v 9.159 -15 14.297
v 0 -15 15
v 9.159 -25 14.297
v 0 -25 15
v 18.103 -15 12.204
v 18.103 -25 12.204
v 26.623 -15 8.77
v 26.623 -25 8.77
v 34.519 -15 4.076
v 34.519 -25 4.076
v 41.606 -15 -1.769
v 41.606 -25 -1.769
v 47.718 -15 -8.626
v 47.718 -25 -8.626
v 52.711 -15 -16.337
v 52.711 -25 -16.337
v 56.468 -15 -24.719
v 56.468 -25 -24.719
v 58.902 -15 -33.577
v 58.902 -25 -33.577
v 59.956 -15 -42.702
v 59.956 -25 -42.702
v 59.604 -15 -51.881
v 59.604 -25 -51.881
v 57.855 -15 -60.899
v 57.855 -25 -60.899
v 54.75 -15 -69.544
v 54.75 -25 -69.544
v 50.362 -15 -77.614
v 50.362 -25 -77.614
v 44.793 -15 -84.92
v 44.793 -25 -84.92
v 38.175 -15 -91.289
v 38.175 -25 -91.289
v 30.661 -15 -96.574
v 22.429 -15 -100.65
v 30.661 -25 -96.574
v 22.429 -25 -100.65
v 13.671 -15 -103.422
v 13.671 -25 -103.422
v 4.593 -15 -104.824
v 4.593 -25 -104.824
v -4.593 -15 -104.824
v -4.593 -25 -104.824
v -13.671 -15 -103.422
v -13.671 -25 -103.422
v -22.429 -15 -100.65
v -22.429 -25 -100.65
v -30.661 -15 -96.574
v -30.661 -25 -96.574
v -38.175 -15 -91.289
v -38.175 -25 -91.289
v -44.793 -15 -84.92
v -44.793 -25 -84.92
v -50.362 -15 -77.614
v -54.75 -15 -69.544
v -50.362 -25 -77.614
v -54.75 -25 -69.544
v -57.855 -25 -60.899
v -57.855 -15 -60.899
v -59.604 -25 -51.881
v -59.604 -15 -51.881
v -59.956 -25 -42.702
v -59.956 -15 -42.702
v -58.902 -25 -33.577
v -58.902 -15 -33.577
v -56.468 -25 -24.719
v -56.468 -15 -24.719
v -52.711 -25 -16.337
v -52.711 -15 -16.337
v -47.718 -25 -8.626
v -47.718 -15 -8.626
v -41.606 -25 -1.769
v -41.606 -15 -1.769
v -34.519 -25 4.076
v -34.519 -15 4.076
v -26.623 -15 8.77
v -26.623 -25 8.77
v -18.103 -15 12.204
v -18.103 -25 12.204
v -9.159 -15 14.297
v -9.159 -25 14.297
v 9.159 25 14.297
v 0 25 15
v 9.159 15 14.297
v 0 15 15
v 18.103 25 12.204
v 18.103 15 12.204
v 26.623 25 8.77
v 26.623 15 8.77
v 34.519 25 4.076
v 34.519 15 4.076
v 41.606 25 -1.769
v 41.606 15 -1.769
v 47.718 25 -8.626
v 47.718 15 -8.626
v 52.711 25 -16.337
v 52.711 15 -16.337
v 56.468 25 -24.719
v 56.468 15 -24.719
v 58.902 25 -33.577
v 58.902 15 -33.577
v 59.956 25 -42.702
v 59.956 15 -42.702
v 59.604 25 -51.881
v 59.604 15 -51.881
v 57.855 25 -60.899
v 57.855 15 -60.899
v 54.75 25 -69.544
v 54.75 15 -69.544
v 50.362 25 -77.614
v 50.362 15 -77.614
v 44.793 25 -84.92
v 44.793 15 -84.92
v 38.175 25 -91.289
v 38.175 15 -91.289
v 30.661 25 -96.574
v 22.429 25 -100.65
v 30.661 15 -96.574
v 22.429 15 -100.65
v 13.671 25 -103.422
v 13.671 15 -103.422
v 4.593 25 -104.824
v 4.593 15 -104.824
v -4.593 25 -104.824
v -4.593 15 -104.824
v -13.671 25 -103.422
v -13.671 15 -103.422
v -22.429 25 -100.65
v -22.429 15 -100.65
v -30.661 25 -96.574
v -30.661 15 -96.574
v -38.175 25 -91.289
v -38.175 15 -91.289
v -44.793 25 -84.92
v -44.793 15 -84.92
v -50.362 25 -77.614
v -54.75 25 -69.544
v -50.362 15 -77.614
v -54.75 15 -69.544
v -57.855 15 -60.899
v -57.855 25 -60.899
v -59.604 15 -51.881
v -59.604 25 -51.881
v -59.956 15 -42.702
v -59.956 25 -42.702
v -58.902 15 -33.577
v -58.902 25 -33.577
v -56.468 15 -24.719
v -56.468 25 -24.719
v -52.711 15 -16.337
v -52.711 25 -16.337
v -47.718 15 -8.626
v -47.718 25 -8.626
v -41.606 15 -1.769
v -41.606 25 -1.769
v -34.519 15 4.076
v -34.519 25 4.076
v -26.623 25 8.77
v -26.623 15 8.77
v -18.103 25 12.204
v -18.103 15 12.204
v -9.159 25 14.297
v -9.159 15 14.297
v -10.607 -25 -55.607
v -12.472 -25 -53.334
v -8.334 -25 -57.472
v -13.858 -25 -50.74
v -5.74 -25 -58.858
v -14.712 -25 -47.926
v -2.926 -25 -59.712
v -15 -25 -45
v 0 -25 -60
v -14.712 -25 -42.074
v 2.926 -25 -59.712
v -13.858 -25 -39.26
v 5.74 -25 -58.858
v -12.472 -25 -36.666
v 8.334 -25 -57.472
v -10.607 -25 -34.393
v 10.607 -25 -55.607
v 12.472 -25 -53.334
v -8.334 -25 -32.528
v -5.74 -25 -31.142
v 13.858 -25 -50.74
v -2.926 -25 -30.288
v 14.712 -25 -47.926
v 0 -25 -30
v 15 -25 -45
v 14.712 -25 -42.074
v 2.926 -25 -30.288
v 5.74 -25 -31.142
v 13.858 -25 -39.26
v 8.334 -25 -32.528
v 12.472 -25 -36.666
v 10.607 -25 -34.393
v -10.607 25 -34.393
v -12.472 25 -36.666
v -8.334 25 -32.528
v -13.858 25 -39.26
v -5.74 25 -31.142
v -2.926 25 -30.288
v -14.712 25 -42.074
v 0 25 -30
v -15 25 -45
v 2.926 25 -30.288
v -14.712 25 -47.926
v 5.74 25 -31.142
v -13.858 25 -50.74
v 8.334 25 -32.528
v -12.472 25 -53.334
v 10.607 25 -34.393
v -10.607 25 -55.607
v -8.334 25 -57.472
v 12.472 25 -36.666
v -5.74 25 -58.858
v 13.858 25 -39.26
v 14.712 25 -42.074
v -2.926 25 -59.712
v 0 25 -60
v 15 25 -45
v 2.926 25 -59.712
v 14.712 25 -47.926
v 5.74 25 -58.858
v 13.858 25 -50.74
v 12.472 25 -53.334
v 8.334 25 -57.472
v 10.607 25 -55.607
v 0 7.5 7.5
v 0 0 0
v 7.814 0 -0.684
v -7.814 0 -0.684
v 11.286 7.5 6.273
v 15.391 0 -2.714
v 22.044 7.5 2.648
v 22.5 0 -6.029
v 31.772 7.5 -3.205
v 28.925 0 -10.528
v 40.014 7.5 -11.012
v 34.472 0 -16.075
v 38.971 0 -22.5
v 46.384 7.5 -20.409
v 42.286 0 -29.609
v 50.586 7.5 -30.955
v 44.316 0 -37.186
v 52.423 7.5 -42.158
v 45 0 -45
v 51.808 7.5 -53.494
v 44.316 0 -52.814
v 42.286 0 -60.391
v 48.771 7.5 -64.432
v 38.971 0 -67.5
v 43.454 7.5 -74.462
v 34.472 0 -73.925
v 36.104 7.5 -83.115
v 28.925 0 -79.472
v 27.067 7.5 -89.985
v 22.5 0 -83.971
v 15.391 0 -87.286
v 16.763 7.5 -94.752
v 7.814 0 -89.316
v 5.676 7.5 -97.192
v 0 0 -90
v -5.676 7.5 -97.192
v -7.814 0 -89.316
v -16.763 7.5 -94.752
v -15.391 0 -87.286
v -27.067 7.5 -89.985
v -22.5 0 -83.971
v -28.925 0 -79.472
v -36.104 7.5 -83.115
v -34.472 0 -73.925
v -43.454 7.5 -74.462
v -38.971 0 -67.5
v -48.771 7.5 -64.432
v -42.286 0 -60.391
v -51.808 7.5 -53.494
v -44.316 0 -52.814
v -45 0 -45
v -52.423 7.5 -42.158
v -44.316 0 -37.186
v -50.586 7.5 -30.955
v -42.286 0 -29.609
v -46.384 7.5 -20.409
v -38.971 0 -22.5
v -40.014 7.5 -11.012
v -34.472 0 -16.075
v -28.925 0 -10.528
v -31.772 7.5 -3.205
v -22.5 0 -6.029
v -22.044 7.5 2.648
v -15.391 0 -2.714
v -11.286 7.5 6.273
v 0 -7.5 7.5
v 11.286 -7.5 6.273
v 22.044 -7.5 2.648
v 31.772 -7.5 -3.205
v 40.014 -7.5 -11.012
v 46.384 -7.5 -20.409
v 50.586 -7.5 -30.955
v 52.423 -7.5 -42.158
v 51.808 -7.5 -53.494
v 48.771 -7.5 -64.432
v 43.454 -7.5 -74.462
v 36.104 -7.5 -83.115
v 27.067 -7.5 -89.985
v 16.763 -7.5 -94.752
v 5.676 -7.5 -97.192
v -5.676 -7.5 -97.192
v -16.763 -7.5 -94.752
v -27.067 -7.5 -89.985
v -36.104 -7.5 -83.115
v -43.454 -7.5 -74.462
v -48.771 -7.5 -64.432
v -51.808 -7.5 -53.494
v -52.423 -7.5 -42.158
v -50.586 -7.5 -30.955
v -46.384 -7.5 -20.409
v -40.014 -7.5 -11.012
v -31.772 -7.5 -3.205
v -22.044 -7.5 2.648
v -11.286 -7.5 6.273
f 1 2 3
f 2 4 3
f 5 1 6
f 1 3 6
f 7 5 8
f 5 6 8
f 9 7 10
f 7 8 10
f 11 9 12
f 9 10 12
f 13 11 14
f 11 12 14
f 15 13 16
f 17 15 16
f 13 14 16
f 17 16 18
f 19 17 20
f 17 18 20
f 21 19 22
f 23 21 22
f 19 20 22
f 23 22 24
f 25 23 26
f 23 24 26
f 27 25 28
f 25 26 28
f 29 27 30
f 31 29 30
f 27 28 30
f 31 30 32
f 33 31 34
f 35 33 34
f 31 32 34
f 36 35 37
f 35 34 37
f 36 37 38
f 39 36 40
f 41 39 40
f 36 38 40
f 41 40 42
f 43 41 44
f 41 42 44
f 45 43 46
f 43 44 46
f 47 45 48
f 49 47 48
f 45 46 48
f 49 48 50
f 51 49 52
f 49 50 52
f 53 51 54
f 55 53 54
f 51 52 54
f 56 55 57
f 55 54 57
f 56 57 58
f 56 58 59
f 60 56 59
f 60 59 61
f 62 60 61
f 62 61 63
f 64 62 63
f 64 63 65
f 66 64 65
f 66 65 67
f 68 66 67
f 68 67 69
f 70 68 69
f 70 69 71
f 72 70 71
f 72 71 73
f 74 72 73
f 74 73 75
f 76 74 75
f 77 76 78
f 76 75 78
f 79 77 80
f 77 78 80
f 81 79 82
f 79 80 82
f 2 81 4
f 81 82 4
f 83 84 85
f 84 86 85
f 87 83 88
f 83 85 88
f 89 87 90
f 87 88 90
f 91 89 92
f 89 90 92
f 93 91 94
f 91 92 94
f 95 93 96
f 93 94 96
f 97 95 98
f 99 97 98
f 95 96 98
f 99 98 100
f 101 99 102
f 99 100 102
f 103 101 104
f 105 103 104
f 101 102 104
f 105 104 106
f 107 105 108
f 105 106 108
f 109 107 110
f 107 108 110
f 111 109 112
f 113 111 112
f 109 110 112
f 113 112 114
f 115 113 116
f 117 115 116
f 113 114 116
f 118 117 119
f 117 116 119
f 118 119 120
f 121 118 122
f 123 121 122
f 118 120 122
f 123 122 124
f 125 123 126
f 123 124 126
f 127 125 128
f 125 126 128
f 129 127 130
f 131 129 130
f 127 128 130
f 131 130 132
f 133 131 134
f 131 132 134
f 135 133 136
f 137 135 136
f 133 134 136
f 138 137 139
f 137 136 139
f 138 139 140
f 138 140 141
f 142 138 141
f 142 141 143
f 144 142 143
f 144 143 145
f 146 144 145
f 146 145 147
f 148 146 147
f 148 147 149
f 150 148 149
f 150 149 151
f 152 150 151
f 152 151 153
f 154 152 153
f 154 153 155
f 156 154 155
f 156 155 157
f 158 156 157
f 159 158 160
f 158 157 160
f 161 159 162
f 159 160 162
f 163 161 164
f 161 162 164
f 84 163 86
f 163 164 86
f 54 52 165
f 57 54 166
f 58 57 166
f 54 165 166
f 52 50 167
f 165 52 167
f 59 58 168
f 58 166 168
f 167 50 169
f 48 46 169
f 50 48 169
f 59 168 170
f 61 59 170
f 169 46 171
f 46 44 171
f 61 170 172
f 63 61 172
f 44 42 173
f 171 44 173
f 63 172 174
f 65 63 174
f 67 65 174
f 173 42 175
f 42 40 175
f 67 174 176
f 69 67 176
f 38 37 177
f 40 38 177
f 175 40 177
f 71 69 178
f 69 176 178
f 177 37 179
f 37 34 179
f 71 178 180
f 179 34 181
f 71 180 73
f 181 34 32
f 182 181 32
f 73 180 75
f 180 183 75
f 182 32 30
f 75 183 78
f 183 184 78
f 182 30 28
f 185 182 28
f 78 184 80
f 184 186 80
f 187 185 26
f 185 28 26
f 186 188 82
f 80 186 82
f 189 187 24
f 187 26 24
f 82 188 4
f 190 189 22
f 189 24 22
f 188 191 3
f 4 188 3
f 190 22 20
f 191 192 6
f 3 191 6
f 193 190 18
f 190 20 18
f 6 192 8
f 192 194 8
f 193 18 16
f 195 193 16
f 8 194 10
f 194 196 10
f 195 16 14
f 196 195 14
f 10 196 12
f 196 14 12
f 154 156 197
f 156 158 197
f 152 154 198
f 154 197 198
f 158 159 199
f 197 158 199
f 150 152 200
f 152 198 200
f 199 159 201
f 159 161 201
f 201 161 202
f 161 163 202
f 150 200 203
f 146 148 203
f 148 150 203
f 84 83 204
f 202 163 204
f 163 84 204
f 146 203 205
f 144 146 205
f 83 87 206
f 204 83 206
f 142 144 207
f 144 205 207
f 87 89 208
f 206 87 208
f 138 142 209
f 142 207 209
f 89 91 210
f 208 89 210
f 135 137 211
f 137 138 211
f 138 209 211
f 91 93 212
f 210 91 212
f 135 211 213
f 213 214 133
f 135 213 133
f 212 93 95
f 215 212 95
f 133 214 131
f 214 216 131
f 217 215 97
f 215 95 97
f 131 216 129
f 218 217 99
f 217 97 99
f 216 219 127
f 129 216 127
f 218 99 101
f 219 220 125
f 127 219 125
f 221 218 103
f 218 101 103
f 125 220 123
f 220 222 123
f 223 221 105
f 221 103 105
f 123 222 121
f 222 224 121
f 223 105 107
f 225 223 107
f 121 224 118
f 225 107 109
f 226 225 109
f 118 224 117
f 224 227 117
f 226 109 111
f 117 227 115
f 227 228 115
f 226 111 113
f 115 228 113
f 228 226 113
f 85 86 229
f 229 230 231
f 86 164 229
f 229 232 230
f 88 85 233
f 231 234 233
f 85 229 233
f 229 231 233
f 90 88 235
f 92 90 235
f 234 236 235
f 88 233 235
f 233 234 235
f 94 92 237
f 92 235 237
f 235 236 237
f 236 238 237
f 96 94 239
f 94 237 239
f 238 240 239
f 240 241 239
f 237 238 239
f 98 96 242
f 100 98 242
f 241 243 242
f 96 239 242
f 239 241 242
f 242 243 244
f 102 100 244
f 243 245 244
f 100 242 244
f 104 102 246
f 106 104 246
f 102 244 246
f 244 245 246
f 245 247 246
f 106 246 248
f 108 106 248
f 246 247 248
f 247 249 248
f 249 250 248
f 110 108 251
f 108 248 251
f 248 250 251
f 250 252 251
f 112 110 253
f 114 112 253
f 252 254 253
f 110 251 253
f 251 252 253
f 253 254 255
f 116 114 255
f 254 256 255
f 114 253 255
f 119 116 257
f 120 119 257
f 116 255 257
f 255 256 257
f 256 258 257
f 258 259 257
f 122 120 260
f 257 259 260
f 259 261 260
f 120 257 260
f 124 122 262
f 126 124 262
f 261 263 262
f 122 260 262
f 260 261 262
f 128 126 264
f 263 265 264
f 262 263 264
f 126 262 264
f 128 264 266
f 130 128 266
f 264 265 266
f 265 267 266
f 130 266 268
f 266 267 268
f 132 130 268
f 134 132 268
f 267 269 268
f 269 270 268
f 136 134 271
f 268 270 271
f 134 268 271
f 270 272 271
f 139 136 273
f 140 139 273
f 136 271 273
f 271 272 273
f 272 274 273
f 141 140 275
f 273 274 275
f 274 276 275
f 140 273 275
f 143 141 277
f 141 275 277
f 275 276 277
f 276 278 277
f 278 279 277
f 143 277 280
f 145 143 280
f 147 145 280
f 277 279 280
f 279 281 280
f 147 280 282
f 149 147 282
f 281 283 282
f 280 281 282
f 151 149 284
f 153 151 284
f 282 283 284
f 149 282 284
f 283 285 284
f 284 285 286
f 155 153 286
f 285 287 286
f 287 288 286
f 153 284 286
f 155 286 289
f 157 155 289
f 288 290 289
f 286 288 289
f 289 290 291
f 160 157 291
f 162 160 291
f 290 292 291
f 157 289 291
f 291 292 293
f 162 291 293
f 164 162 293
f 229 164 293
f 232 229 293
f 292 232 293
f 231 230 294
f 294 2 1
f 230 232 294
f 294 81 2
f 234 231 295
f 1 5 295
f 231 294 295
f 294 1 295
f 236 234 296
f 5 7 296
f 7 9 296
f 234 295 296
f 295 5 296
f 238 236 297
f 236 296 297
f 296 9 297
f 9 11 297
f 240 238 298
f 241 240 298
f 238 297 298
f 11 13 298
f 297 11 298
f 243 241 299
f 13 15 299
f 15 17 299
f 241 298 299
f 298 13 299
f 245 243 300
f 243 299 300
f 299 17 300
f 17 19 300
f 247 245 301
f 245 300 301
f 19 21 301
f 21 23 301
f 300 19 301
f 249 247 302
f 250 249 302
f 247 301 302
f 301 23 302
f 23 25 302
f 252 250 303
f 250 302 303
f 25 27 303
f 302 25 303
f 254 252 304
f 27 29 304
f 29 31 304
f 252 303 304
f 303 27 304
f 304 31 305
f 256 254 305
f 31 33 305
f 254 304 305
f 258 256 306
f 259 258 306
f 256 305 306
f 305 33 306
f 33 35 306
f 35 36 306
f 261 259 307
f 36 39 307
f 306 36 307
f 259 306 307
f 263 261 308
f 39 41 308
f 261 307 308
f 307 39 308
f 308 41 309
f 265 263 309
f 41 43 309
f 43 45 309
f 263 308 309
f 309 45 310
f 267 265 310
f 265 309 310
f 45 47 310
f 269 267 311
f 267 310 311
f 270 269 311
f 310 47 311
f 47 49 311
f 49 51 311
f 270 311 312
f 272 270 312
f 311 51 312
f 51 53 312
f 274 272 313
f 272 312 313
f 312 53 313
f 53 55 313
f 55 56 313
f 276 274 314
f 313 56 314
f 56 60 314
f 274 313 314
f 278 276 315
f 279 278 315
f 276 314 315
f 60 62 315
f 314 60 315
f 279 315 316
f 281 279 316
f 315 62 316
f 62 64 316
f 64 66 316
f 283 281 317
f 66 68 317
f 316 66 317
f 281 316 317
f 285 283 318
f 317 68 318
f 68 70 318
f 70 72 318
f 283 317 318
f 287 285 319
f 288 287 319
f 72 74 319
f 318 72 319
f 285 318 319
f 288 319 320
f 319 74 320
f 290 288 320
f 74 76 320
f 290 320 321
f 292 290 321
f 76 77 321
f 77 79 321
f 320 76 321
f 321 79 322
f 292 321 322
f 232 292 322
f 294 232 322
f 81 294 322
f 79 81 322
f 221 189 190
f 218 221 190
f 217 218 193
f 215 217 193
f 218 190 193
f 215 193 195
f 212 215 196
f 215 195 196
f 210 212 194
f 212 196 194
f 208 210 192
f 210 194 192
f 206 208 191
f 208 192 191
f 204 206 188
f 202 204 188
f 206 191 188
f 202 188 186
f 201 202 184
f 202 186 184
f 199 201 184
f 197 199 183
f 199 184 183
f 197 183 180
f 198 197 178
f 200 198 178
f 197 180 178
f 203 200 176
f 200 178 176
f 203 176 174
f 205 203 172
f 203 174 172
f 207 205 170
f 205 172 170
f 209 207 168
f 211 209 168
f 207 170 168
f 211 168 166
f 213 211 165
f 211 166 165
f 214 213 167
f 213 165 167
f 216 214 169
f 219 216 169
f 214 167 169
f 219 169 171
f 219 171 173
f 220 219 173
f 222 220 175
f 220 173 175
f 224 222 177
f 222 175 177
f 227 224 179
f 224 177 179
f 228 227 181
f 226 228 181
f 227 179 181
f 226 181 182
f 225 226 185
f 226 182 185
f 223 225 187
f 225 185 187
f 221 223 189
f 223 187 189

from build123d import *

# Parameters (mm, degrees)
F2_R     = 15
F3_DEPTH = 50


with BuildPart() as f1:
    # F0 (on Right) → F1 (revolve)
    with BuildSketch(Plane.YZ):
        Polygon((15, 15), (0, 0), (-15, 15), (-25, 15), (-25, -45), (25, -45), (25, 15), align=None)
    revolve(axis=Axis((0, 0, -45), (0, 1, 0)))

    # F2 (on face) → F3 (cut)
    with BuildSketch(Plane.XZ.offset(25)):
        with Locations((0, -45)):
            Circle(F2_R)
    extrude(amount=-F3_DEPTH, mode=Mode.SUBTRACT)


solid = f1.part
